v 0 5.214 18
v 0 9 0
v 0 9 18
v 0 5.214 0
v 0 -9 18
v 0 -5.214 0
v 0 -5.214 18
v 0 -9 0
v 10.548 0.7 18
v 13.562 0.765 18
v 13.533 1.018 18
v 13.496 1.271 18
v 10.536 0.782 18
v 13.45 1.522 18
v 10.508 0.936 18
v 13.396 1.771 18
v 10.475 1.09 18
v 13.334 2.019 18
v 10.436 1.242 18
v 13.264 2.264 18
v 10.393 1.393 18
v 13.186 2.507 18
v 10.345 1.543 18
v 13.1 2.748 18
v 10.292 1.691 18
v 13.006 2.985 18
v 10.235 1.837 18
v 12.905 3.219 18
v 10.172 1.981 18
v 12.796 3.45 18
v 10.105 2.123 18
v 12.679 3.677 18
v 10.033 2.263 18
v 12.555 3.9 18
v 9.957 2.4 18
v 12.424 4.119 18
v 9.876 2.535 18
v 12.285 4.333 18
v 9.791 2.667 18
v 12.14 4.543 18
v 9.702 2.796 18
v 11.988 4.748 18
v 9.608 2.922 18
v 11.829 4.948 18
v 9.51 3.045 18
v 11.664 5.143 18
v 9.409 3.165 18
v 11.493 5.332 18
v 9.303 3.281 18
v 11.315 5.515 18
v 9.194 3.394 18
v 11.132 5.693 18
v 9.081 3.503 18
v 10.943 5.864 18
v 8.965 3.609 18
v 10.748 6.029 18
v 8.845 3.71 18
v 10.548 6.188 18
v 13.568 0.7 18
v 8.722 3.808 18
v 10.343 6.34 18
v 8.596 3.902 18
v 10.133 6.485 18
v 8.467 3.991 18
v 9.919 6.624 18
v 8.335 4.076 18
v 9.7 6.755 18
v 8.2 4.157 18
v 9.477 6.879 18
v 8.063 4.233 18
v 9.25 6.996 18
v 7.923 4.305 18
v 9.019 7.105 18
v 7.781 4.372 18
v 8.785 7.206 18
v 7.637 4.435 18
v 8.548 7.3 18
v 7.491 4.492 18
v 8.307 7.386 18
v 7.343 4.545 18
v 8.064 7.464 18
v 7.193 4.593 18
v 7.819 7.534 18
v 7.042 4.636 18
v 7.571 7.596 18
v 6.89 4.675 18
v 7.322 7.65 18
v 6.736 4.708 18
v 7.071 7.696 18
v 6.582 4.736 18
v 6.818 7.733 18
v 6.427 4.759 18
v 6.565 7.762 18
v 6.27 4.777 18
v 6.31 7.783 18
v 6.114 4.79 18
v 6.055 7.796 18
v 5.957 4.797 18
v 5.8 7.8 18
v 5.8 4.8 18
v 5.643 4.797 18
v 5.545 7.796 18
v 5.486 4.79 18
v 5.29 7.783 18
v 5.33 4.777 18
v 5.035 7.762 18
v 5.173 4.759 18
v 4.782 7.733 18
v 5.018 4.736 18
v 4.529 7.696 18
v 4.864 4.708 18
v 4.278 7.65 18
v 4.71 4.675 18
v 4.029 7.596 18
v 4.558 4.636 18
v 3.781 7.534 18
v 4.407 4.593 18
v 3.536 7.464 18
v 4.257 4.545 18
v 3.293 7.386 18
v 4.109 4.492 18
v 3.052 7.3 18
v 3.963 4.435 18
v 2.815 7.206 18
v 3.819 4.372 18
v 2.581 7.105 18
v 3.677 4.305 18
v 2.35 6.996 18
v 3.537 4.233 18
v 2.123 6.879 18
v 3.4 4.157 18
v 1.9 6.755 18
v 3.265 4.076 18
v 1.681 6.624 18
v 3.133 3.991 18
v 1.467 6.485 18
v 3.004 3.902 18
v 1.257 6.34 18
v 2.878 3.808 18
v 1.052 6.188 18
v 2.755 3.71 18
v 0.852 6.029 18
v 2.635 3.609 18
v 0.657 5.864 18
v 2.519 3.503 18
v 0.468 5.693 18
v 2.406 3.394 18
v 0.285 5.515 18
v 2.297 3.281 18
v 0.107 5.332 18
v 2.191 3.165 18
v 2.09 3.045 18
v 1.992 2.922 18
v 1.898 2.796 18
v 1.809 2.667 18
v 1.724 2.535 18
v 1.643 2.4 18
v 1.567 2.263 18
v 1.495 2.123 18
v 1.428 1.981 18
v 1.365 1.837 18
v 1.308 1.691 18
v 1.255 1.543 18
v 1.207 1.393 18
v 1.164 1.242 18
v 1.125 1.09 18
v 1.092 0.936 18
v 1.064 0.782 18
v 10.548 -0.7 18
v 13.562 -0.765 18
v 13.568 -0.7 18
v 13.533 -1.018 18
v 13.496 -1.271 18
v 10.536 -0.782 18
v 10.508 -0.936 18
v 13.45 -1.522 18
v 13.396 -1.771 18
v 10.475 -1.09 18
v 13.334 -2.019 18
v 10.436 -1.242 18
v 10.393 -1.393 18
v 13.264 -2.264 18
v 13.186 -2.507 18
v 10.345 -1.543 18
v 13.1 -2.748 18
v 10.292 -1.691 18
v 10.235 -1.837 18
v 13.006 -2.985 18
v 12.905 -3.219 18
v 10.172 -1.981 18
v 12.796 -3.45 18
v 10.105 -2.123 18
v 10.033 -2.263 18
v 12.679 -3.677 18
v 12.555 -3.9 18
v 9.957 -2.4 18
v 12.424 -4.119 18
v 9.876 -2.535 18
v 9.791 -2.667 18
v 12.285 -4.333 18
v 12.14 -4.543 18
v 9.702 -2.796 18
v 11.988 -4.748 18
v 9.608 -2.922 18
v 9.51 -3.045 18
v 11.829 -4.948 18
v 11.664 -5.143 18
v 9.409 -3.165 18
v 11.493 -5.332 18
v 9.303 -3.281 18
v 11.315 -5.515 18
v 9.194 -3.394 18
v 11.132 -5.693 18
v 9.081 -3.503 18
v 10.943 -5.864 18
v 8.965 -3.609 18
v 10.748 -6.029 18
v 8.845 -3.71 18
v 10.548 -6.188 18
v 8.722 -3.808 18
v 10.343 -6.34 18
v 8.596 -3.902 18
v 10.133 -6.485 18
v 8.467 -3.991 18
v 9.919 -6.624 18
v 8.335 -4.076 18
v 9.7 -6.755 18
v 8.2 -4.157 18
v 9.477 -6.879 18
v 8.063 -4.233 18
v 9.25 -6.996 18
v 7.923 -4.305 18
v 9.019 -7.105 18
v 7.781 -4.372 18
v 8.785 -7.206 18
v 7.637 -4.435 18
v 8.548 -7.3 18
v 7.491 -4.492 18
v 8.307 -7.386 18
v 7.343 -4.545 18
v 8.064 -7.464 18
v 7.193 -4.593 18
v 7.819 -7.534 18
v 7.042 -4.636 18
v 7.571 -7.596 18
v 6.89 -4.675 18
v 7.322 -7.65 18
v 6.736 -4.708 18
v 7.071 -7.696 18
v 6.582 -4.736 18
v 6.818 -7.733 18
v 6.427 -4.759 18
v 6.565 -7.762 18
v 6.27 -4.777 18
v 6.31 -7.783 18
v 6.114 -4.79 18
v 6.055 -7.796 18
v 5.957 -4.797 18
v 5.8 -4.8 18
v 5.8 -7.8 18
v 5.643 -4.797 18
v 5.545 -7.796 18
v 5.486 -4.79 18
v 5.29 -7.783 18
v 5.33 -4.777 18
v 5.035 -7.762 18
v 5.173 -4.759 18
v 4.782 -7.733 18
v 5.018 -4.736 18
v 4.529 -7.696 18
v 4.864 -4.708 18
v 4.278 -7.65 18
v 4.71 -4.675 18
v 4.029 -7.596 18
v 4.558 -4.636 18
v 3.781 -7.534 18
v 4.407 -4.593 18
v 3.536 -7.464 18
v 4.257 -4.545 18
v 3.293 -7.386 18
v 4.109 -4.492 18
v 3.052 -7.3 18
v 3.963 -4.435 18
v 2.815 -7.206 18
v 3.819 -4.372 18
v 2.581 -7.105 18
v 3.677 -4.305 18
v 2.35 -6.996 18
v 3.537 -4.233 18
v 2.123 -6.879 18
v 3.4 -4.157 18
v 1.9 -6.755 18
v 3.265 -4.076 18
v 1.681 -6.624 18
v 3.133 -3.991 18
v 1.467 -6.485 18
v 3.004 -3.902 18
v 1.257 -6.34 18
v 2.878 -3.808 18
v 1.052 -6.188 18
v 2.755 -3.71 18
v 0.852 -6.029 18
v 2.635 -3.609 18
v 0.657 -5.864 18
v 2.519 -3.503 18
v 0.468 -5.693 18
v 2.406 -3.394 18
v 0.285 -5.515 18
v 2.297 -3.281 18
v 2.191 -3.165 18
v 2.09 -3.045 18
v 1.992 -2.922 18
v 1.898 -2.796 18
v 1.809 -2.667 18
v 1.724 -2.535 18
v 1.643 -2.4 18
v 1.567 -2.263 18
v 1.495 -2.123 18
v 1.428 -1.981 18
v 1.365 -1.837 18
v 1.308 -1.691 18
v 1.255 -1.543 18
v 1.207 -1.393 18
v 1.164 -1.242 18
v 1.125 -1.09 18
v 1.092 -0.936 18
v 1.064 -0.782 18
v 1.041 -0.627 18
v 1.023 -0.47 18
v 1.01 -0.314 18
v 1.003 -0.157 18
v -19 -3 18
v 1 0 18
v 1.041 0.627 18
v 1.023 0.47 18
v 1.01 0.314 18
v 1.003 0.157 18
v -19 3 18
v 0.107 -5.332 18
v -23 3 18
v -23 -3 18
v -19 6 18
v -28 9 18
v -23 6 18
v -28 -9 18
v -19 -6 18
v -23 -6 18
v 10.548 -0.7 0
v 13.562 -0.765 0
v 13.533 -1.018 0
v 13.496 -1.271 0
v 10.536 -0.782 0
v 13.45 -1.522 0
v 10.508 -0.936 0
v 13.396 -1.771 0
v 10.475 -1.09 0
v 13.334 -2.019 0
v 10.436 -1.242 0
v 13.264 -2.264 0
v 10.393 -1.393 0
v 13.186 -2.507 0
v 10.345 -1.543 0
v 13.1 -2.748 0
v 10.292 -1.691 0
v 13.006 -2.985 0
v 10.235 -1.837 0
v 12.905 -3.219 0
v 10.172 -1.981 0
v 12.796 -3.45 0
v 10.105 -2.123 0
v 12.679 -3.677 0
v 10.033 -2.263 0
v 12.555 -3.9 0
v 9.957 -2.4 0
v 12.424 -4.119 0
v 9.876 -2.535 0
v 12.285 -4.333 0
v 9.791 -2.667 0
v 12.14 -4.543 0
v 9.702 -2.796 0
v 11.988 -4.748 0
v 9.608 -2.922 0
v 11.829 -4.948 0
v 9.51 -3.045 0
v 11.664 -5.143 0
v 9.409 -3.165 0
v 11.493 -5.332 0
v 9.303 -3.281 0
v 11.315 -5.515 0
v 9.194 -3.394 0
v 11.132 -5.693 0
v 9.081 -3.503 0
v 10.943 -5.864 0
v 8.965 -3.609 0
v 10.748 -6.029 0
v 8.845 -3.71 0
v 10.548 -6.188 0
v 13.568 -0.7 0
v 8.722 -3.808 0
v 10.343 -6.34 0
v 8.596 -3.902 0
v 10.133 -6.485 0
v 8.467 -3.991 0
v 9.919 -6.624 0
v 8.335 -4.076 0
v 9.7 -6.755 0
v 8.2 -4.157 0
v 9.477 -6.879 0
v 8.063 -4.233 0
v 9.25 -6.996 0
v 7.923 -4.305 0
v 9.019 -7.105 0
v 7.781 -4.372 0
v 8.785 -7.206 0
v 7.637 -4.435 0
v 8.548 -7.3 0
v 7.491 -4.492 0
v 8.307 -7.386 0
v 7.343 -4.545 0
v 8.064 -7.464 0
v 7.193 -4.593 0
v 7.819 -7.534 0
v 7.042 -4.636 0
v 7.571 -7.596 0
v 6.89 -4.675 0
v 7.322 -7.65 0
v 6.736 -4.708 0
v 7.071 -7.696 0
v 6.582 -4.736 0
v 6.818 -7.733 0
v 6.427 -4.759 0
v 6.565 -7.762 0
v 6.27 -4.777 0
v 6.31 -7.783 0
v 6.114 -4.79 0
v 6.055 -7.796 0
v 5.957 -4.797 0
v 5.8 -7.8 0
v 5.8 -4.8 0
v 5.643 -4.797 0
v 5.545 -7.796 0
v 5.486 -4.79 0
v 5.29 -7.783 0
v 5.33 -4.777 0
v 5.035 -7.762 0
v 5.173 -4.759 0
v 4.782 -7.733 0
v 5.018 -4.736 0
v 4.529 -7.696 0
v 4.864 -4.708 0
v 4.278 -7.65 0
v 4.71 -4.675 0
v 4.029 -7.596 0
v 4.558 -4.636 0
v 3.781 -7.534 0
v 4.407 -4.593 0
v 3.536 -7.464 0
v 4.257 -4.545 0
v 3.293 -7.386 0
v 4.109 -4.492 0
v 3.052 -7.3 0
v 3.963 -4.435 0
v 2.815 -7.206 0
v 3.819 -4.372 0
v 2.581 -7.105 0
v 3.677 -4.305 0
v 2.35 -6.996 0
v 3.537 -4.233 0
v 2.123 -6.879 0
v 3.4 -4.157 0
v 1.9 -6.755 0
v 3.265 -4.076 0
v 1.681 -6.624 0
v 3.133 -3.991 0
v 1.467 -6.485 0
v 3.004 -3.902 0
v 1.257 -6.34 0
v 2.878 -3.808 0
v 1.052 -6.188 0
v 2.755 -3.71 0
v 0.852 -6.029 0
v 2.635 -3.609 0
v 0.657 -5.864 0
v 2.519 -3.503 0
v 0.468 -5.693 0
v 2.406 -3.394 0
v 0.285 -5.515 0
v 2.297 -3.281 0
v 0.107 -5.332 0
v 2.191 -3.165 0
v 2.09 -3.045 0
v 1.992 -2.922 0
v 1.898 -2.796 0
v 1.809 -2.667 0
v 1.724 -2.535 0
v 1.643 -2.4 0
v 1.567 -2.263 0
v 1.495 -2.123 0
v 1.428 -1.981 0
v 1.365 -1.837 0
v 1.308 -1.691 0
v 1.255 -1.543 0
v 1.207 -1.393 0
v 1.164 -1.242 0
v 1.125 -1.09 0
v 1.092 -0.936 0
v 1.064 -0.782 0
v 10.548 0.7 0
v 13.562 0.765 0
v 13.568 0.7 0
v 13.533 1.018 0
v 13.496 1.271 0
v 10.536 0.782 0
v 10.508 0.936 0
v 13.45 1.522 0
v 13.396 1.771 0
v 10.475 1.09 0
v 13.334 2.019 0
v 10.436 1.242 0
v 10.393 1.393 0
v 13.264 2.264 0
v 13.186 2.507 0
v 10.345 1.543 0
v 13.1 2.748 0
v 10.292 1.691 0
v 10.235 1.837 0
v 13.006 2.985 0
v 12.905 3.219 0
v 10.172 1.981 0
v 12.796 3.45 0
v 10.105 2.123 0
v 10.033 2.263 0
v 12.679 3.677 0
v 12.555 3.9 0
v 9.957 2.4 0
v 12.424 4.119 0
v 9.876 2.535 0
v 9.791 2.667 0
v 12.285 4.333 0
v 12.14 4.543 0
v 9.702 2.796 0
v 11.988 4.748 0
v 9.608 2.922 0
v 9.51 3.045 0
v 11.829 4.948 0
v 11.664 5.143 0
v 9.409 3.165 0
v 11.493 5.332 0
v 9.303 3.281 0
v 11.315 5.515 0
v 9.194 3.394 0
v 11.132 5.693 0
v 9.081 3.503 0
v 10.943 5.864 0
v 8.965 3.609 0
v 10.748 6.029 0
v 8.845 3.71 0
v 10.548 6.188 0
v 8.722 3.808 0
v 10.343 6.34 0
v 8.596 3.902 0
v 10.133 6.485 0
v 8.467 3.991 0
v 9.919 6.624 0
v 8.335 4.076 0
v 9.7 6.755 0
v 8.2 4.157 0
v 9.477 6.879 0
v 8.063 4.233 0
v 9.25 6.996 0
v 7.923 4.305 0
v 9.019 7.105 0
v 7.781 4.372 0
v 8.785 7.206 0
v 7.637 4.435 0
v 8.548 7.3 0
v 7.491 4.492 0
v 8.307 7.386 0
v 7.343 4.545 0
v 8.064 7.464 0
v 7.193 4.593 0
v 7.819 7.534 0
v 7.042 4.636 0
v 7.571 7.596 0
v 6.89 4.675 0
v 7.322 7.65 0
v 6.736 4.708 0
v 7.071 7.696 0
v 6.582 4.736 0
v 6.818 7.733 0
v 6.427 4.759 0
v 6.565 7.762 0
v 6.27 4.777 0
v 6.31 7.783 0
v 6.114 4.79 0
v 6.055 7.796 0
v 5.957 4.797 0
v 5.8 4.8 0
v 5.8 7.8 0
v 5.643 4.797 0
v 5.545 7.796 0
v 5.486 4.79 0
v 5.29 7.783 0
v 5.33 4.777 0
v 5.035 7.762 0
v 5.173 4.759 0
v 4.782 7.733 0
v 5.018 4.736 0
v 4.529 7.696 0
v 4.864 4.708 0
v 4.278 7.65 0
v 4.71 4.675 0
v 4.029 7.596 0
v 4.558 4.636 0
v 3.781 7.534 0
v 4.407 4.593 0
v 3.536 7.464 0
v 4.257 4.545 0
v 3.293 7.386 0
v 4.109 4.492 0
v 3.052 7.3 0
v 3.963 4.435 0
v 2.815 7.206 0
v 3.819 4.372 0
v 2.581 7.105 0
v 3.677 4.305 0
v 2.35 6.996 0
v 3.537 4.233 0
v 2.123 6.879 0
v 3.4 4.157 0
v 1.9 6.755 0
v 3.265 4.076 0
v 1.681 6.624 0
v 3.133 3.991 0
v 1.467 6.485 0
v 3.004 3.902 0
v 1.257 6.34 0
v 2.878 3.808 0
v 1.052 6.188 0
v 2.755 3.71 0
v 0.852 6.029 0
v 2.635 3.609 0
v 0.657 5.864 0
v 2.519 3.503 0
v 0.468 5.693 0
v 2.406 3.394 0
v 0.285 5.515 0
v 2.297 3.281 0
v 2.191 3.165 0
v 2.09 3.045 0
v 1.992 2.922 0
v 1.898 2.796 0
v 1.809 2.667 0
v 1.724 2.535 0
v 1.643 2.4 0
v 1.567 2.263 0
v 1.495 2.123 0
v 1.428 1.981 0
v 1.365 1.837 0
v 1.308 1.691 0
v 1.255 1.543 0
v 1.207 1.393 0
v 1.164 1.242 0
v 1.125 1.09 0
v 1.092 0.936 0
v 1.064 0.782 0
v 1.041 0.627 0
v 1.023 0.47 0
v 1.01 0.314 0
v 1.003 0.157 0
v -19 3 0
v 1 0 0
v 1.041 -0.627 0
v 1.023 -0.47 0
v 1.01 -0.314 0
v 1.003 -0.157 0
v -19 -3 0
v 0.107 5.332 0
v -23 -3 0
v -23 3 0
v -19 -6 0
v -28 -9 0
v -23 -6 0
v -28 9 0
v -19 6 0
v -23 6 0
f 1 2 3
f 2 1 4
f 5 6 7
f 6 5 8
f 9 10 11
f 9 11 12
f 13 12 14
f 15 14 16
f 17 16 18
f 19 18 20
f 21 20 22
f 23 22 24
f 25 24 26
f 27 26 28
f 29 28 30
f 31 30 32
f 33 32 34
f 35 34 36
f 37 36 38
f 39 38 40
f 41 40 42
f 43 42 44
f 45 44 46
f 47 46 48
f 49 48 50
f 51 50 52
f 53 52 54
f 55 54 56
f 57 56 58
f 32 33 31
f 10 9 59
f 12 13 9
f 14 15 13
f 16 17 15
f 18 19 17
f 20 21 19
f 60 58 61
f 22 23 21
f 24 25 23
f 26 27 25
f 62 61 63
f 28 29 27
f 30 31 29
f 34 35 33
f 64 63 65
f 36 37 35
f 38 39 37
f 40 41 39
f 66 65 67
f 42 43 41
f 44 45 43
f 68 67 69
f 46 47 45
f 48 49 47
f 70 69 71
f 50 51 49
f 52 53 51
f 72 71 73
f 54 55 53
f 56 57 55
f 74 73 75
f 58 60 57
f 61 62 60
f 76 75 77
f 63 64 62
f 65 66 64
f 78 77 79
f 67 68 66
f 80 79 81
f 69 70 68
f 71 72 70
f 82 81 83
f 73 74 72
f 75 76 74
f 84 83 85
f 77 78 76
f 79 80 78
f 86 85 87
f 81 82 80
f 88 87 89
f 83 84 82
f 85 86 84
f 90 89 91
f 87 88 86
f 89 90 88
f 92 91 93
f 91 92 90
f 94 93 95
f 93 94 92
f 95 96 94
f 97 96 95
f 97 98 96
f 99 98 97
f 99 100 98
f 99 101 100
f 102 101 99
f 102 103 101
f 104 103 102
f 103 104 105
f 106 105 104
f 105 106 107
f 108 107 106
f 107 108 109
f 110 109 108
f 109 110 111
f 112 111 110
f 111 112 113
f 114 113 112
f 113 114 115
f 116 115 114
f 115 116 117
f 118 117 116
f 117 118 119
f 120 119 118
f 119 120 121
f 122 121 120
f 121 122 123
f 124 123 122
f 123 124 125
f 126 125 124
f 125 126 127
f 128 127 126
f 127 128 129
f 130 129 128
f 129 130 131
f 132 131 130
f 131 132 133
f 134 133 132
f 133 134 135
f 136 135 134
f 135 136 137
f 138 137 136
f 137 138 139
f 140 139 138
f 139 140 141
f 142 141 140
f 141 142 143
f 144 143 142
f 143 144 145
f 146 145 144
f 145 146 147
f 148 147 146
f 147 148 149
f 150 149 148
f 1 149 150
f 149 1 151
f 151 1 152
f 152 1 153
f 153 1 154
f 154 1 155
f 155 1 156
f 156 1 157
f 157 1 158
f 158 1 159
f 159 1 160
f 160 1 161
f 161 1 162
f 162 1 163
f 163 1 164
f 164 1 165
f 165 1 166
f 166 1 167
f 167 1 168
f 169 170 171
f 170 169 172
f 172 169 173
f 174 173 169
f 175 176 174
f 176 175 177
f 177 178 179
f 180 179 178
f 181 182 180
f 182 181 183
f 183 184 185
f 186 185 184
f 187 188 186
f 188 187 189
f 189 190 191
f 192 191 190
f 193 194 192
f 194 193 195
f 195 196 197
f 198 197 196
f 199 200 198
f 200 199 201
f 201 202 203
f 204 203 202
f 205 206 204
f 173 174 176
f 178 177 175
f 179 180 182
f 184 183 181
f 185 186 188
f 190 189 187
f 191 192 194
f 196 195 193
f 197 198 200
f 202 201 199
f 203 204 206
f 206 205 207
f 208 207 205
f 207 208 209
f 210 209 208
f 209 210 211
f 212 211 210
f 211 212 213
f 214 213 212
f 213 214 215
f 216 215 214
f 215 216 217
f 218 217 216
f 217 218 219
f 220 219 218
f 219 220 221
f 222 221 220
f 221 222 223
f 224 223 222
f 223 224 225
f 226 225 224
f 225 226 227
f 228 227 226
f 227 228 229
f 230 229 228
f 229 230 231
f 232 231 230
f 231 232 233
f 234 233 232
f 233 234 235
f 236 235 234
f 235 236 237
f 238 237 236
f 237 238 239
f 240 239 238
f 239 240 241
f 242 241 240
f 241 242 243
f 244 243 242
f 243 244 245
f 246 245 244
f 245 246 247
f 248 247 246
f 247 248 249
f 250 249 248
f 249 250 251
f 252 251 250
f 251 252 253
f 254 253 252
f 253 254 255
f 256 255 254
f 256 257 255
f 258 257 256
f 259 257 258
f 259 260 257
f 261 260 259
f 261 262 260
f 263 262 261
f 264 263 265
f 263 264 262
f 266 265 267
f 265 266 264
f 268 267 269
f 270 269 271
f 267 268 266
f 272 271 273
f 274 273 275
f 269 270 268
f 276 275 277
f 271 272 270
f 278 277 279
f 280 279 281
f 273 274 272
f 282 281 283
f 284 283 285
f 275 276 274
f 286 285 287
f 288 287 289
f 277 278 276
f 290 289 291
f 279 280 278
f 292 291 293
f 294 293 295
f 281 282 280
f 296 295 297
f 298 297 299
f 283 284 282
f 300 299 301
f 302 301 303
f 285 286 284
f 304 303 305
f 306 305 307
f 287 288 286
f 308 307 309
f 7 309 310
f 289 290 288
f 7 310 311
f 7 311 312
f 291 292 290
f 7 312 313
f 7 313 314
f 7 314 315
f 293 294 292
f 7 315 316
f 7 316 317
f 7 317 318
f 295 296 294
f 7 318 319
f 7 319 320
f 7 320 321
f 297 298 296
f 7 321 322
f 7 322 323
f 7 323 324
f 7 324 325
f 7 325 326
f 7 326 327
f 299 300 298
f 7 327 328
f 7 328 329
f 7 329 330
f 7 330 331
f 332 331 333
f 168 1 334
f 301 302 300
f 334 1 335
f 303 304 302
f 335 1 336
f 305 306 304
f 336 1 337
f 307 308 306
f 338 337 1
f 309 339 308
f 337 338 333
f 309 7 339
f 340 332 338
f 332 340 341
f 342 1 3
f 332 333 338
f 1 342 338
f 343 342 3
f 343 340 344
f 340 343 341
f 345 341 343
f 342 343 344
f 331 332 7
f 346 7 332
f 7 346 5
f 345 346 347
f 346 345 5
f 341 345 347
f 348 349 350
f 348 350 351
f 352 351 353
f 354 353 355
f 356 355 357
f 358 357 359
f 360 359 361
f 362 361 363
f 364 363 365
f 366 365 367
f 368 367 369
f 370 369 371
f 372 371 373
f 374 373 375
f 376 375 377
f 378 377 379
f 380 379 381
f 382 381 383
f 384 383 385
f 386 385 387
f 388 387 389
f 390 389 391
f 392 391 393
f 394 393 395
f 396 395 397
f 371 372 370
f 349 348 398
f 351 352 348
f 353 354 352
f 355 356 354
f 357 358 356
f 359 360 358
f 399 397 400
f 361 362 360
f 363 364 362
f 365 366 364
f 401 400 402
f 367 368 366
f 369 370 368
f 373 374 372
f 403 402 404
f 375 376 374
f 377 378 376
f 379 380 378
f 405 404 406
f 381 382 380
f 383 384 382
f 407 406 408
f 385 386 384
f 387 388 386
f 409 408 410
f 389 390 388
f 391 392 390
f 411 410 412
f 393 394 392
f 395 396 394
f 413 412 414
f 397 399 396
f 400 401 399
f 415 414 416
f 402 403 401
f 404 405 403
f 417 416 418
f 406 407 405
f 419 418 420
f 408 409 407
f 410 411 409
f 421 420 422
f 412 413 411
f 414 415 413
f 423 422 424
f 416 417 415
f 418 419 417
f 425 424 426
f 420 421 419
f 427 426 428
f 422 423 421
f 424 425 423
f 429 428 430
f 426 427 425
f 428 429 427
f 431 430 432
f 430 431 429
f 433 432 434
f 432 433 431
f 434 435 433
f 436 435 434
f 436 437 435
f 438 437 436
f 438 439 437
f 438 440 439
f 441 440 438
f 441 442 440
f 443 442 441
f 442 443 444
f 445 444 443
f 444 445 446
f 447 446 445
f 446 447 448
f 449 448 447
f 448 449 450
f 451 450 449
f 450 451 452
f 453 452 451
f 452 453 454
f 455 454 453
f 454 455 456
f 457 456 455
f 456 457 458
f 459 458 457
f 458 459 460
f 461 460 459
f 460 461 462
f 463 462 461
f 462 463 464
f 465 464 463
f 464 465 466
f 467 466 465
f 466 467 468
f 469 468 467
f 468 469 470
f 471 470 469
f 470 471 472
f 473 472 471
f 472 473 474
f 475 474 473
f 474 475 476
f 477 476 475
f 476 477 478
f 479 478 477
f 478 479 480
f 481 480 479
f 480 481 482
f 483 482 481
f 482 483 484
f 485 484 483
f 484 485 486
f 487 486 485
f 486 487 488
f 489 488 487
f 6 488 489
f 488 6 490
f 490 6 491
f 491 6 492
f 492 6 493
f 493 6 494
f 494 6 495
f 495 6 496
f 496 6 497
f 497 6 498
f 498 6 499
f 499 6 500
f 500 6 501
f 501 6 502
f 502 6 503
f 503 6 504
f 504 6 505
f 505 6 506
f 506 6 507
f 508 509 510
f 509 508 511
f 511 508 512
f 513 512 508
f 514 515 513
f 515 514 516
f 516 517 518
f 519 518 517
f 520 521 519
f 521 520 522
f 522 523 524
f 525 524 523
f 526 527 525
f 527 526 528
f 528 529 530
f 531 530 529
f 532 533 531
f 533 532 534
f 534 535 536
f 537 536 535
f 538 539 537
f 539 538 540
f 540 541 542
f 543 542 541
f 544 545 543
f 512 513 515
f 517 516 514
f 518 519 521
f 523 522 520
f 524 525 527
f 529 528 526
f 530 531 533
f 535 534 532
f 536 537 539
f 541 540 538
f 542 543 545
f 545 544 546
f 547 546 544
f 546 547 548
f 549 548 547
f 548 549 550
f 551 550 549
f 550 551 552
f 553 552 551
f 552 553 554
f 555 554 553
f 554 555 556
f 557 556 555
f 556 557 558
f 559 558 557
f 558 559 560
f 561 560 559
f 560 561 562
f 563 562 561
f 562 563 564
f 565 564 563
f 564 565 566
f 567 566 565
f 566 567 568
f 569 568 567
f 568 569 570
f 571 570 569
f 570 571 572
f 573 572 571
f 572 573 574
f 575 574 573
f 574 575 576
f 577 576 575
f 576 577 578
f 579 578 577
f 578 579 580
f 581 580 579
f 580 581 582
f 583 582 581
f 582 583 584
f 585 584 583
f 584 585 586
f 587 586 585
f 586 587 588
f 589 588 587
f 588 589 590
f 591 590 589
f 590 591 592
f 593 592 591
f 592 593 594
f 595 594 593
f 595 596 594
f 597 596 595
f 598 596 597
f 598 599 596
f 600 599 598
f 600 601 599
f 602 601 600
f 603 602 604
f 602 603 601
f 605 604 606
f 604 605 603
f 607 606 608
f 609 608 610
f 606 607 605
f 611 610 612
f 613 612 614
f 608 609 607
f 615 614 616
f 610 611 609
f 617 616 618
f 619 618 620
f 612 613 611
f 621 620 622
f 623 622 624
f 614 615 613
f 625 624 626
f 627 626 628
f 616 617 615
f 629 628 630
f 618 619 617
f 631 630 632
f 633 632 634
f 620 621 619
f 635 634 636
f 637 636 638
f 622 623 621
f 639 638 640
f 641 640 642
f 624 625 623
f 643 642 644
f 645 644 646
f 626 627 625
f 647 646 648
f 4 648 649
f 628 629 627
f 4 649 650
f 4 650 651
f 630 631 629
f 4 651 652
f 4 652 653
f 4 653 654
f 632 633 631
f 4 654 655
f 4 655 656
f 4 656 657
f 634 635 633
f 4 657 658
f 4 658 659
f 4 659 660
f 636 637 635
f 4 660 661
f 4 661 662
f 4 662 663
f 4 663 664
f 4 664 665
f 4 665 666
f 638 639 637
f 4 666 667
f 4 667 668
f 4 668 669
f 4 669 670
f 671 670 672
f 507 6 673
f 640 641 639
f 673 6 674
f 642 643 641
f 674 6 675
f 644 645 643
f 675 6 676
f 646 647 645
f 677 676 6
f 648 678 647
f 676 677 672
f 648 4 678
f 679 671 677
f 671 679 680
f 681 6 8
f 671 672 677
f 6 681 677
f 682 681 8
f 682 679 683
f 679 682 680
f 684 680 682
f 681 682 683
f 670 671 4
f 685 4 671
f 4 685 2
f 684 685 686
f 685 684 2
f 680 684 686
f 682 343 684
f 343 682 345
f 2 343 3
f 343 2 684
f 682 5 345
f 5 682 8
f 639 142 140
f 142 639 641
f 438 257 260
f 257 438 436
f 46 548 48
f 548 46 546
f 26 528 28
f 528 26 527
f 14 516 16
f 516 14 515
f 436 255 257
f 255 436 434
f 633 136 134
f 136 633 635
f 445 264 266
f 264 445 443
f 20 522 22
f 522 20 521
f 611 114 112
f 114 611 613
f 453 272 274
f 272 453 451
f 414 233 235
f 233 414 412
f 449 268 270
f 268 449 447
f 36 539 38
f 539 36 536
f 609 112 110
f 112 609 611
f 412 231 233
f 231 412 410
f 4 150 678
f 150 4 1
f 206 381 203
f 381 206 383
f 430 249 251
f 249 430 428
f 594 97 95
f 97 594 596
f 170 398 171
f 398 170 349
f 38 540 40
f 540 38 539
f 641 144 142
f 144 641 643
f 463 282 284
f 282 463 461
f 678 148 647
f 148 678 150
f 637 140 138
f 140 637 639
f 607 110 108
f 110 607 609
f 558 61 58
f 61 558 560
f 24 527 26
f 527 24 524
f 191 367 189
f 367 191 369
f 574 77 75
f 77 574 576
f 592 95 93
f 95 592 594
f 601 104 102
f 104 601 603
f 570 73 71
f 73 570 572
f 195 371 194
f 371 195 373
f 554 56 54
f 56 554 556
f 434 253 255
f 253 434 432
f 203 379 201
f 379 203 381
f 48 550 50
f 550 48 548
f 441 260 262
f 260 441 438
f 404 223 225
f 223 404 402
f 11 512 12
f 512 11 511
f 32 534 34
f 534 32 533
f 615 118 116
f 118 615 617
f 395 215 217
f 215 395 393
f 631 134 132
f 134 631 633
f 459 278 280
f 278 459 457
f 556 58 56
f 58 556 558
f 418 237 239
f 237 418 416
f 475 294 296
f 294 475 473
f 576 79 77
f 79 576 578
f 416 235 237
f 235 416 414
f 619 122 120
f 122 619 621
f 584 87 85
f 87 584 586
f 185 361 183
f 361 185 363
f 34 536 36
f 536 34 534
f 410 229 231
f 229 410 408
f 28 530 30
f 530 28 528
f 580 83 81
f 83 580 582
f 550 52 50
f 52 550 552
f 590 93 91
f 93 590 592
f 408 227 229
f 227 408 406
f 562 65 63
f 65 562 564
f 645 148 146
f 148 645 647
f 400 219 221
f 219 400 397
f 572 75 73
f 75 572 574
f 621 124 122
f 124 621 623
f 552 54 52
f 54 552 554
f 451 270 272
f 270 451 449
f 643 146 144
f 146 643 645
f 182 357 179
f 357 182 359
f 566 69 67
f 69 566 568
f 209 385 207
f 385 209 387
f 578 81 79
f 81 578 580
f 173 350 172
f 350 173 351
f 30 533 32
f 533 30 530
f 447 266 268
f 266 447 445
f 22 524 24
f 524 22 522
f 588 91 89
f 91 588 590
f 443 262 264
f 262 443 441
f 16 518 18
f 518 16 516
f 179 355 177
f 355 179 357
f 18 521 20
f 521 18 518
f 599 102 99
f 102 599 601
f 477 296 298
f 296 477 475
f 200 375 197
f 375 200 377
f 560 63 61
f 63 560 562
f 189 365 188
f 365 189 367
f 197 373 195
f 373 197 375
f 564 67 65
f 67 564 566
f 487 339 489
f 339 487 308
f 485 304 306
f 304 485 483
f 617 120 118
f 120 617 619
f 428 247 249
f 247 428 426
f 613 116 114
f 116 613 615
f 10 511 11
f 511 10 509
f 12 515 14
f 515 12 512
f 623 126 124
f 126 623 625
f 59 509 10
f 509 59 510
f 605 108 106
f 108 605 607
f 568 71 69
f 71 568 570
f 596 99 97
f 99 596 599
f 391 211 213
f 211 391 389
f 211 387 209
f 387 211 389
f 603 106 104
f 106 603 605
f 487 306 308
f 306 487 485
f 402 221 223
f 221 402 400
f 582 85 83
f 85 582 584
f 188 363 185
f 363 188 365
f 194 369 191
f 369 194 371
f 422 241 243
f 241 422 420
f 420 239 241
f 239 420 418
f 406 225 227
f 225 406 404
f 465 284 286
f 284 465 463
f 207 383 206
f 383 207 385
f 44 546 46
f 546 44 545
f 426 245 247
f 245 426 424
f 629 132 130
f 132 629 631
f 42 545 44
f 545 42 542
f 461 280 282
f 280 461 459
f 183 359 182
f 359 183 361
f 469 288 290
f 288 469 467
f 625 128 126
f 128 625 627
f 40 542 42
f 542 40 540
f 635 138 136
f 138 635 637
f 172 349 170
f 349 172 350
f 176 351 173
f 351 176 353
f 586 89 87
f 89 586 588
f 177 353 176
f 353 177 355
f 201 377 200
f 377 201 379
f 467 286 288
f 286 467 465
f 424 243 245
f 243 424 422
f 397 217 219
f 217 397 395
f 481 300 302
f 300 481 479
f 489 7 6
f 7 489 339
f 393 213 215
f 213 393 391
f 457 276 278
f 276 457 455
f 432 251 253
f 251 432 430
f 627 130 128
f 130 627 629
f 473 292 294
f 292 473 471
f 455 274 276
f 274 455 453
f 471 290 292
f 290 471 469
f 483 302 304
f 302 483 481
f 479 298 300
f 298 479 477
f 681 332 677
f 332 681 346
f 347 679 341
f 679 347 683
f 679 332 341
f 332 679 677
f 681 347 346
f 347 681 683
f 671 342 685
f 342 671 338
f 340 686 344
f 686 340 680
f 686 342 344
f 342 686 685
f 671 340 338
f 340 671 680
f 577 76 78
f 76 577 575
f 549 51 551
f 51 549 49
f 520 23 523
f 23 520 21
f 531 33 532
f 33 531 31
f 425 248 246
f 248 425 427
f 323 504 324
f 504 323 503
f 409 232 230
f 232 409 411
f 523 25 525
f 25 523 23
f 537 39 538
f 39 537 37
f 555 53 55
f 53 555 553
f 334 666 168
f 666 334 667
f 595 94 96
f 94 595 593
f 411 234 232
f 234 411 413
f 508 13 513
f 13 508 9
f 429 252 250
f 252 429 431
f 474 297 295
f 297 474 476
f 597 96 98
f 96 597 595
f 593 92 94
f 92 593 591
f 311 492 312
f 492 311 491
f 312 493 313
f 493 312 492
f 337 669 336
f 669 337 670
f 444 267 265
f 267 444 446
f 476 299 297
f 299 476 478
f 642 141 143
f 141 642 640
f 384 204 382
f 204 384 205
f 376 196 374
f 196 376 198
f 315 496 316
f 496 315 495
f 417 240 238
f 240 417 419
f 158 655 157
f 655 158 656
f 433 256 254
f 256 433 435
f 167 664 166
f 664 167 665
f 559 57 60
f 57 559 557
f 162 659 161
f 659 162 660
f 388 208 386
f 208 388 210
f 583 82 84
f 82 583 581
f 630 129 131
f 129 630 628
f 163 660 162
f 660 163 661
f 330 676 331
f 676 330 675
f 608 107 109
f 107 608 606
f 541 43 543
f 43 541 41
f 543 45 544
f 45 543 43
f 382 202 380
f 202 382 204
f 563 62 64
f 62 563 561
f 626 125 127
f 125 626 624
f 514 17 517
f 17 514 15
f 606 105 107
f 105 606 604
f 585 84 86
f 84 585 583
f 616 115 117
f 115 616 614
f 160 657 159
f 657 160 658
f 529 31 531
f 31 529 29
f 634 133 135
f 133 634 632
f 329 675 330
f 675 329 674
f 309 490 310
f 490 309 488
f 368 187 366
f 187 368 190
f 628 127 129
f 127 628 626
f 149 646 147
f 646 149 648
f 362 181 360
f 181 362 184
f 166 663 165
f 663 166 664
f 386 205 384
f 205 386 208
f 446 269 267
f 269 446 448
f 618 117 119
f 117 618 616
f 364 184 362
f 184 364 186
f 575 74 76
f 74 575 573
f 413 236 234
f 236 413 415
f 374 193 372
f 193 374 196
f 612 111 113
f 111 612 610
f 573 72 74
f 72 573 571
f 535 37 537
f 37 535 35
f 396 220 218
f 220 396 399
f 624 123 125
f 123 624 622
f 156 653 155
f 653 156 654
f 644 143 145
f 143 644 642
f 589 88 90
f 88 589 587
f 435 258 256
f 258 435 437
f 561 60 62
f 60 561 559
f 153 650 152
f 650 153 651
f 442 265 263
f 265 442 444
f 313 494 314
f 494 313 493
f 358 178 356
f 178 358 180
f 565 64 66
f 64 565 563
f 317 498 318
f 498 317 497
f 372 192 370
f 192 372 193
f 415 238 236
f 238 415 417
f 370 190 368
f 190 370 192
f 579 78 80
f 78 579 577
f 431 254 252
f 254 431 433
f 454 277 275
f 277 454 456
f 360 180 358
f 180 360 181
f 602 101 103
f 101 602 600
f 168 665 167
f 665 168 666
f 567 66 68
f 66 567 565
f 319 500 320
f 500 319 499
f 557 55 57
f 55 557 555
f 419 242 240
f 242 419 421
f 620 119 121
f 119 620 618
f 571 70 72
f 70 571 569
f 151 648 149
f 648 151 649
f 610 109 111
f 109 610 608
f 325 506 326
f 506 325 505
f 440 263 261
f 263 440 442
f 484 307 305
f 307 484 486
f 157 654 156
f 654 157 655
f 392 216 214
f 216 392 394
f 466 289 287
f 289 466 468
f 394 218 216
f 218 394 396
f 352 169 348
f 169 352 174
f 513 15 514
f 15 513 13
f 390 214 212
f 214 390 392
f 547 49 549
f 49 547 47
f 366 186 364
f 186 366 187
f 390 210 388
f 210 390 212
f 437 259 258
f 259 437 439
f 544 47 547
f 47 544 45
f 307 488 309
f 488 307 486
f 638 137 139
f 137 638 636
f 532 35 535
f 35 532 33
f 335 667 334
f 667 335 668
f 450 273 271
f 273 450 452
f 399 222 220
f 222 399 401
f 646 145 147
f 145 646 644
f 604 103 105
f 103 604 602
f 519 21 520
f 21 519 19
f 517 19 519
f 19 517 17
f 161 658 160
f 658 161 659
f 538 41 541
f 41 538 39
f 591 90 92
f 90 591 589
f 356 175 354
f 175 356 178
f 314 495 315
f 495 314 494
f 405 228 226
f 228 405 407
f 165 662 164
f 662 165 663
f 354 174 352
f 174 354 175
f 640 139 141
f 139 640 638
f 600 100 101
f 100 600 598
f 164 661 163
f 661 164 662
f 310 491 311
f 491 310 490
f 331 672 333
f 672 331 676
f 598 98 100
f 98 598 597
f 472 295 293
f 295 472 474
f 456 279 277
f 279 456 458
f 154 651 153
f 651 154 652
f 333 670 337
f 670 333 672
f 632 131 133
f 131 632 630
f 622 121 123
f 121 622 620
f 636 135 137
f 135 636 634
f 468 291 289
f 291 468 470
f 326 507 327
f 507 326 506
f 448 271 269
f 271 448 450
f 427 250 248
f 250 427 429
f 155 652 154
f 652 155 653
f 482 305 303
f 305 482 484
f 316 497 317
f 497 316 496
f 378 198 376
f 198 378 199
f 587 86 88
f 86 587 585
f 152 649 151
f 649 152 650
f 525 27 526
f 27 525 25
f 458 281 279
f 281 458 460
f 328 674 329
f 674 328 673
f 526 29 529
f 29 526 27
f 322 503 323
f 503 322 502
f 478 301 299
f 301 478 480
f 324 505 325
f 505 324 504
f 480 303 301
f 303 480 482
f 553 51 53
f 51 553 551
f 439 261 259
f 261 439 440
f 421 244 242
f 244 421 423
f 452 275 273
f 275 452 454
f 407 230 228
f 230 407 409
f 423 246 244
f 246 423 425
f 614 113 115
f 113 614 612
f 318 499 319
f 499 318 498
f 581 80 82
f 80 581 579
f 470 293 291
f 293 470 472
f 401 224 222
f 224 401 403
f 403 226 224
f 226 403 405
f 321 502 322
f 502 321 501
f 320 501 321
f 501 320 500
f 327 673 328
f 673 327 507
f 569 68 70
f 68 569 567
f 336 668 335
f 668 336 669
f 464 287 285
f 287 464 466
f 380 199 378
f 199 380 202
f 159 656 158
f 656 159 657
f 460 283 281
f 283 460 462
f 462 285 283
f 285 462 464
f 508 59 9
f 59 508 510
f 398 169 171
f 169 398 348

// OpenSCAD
// Universal cable-tie attachment prototype. Measure your pen and check
// clearance against the actual Ender-3 Neo head, CR Touch and bed clips.
pen_diameter = 9;
clip_height = 18;
wall = 3;
clearance = 0.3;
$fn = 192;
r = pen_diameter / 2 + clearance;
cx = r + 1;

difference() {
    union() {
        translate([-28, -9, 0]) cube([28, 18, clip_height]);
        translate([cx, 0, 0]) cylinder(h=clip_height, r=r+wall);
    }
    translate([cx, 0, -1]) cylinder(h=clip_height+2, r=r);
    translate([cx, -0.7, -1]) cube([r+4, 1.4, clip_height+2]);
    for (y = [-6, 3])
        translate([-23, y, -1]) cube([4, 3, clip_height+2]);
}
